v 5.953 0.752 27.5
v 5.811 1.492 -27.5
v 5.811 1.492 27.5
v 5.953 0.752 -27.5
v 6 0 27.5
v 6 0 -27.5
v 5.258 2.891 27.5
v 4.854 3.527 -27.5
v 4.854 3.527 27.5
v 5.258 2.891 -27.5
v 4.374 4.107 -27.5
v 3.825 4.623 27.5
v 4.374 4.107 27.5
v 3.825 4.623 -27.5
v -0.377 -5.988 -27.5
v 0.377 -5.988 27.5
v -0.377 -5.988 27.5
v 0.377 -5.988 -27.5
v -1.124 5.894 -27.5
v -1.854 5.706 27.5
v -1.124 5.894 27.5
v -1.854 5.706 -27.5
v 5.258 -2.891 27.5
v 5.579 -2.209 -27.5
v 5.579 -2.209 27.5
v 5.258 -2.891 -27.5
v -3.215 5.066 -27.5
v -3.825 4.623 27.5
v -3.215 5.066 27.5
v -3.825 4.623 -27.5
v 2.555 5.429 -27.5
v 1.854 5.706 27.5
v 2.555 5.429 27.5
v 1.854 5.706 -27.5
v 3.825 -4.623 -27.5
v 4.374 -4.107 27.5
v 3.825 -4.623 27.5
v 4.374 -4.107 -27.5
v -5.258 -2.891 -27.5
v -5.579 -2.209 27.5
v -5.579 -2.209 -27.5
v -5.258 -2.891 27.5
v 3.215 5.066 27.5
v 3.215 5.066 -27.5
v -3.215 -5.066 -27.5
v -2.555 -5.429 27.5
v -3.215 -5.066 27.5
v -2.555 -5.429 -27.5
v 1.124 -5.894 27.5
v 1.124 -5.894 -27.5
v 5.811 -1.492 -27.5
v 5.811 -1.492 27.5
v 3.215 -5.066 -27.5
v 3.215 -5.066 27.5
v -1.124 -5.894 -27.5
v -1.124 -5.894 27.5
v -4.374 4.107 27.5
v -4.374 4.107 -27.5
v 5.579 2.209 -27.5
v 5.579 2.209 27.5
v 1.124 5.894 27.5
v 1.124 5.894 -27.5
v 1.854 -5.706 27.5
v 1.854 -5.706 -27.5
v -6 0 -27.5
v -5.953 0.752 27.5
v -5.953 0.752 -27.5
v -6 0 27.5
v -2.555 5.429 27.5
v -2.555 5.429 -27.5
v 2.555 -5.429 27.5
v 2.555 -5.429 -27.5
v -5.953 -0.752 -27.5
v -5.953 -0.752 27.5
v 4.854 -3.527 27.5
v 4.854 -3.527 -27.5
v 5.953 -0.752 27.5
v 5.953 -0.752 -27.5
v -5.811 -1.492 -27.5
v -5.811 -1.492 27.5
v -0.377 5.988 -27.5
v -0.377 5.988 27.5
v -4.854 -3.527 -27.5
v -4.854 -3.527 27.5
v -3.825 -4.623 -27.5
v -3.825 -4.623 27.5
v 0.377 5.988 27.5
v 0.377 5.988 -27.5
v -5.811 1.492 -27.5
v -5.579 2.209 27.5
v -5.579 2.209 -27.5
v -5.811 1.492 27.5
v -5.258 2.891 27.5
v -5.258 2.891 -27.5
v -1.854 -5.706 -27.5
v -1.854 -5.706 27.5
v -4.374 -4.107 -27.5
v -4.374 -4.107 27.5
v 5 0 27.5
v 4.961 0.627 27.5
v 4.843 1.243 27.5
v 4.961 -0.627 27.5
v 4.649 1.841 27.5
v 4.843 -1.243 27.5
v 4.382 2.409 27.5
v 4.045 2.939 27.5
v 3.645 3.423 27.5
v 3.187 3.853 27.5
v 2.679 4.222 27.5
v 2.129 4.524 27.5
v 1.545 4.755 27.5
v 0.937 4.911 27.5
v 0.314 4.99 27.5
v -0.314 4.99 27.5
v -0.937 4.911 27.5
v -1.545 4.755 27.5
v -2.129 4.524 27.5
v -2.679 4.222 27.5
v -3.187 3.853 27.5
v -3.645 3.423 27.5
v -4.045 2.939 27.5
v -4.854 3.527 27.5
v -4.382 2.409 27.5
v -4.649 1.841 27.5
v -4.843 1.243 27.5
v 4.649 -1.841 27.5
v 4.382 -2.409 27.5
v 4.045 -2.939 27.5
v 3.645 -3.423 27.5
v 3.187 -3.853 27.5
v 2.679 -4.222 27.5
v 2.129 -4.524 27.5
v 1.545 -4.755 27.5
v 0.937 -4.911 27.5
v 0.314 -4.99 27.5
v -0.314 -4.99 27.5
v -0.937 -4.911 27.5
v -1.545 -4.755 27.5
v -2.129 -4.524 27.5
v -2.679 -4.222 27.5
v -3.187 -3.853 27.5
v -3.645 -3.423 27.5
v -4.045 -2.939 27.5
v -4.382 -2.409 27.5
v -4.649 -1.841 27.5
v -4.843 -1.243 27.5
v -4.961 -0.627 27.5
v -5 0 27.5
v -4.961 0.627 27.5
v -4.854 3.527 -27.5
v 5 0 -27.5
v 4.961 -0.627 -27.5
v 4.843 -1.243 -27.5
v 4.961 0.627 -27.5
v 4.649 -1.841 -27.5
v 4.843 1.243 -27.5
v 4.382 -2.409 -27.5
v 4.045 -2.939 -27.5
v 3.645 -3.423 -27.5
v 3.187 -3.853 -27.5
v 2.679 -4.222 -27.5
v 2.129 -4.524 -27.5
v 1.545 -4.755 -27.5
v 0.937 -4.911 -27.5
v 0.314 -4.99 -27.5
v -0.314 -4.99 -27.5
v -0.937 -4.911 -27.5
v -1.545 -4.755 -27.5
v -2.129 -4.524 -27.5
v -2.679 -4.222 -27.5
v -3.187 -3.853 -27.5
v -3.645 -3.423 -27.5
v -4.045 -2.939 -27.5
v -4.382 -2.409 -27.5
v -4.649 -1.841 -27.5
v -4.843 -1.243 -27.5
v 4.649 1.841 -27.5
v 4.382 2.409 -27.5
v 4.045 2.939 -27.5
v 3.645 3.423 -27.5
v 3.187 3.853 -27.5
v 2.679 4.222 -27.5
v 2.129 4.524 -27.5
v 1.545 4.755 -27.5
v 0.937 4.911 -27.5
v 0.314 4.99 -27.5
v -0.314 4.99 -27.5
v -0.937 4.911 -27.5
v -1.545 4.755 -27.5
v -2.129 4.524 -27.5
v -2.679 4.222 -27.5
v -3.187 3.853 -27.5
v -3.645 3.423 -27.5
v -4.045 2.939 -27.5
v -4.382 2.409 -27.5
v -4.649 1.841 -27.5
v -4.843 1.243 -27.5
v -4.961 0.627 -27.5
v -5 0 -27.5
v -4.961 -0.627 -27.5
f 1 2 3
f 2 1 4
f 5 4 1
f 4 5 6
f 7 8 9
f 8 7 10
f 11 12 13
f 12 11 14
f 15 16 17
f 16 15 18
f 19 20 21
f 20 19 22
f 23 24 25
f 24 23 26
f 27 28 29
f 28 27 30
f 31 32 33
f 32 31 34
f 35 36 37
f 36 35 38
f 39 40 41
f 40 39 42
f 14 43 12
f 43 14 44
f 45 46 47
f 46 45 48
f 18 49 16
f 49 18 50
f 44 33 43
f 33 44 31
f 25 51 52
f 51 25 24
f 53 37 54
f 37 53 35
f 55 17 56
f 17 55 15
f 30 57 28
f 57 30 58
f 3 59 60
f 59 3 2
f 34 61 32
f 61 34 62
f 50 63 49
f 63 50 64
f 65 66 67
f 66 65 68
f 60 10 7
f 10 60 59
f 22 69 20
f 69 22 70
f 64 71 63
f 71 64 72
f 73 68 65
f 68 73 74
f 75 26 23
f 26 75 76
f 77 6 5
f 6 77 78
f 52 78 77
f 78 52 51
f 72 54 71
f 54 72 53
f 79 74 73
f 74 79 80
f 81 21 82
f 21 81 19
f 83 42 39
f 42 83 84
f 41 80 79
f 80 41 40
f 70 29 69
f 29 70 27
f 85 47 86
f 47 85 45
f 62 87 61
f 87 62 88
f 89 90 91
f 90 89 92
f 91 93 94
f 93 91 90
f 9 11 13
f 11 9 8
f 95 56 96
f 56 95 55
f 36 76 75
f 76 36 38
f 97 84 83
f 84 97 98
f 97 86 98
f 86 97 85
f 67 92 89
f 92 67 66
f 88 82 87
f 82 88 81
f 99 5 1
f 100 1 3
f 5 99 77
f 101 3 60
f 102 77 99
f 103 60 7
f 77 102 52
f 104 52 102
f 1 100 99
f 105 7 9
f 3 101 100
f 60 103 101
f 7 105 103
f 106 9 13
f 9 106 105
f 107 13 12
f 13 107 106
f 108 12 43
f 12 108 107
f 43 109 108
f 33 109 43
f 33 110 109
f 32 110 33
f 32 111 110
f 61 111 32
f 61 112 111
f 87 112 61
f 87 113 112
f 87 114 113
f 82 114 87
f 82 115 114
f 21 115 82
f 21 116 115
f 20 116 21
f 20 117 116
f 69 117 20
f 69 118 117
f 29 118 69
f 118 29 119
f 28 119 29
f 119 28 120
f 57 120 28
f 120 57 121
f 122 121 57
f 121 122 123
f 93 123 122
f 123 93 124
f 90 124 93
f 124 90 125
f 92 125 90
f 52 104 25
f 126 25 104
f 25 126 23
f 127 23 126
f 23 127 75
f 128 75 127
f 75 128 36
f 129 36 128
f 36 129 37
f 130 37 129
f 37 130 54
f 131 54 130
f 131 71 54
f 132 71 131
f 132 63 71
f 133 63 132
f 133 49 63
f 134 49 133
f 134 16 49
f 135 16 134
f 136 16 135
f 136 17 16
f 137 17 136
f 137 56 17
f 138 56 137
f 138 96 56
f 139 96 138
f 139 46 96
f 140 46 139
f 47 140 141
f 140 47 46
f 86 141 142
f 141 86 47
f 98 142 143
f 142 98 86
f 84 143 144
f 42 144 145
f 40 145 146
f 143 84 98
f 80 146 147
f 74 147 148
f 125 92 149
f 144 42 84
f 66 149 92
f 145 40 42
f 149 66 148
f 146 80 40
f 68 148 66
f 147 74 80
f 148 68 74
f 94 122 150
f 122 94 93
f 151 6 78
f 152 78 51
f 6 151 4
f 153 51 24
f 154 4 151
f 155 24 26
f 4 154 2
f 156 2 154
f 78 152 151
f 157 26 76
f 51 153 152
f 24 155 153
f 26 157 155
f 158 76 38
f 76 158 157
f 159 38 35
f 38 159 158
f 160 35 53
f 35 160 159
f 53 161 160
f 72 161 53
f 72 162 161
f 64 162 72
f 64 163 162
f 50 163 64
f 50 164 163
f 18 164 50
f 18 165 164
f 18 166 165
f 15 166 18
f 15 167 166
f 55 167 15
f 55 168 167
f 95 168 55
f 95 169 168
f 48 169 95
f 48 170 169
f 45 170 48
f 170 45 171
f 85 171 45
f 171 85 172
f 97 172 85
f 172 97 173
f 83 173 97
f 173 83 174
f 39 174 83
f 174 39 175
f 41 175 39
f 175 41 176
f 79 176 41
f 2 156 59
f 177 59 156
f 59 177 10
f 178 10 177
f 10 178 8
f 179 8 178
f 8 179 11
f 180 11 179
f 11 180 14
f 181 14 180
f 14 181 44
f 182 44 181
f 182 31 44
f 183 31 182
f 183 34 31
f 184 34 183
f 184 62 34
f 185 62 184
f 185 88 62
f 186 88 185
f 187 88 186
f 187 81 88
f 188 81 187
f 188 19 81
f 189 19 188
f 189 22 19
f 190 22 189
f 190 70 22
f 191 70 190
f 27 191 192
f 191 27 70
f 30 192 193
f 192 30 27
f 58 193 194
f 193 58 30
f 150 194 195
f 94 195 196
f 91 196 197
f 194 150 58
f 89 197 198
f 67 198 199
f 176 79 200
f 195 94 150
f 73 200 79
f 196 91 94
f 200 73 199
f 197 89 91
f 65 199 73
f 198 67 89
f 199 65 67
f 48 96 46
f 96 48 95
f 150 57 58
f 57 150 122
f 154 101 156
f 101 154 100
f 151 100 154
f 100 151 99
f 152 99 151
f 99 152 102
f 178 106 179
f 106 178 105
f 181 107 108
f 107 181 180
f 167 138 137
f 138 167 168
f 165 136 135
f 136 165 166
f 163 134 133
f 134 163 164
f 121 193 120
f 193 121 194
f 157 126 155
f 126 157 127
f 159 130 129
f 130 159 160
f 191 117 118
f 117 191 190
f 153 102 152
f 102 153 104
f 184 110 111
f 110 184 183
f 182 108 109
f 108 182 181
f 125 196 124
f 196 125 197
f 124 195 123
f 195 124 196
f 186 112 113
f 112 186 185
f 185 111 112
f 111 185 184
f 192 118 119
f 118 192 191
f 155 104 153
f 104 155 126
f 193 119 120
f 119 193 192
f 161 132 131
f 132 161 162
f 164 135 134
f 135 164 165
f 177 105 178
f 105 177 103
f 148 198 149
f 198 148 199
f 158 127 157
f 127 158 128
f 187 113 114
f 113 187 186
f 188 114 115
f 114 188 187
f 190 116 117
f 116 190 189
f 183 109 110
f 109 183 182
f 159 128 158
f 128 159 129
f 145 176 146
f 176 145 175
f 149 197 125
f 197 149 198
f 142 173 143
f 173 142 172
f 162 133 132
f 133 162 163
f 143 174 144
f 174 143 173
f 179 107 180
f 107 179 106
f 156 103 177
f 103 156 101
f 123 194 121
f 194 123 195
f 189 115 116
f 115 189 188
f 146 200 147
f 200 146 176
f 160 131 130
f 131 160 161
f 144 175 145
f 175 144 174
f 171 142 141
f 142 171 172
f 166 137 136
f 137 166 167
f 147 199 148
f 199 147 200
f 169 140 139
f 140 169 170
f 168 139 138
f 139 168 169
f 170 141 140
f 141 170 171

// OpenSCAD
$fn = 50;


difference() {
	union() {
		translate(v = [0, 0, -27.5000000000]) {
			cylinder(h = 55, r = 6.0000000000);
		}
	}
	union() {
		translate(v = [0, 0, -100.0000000000]) {
			cylinder(h = 200, r = 5.0000000000);
		}
	}
}
